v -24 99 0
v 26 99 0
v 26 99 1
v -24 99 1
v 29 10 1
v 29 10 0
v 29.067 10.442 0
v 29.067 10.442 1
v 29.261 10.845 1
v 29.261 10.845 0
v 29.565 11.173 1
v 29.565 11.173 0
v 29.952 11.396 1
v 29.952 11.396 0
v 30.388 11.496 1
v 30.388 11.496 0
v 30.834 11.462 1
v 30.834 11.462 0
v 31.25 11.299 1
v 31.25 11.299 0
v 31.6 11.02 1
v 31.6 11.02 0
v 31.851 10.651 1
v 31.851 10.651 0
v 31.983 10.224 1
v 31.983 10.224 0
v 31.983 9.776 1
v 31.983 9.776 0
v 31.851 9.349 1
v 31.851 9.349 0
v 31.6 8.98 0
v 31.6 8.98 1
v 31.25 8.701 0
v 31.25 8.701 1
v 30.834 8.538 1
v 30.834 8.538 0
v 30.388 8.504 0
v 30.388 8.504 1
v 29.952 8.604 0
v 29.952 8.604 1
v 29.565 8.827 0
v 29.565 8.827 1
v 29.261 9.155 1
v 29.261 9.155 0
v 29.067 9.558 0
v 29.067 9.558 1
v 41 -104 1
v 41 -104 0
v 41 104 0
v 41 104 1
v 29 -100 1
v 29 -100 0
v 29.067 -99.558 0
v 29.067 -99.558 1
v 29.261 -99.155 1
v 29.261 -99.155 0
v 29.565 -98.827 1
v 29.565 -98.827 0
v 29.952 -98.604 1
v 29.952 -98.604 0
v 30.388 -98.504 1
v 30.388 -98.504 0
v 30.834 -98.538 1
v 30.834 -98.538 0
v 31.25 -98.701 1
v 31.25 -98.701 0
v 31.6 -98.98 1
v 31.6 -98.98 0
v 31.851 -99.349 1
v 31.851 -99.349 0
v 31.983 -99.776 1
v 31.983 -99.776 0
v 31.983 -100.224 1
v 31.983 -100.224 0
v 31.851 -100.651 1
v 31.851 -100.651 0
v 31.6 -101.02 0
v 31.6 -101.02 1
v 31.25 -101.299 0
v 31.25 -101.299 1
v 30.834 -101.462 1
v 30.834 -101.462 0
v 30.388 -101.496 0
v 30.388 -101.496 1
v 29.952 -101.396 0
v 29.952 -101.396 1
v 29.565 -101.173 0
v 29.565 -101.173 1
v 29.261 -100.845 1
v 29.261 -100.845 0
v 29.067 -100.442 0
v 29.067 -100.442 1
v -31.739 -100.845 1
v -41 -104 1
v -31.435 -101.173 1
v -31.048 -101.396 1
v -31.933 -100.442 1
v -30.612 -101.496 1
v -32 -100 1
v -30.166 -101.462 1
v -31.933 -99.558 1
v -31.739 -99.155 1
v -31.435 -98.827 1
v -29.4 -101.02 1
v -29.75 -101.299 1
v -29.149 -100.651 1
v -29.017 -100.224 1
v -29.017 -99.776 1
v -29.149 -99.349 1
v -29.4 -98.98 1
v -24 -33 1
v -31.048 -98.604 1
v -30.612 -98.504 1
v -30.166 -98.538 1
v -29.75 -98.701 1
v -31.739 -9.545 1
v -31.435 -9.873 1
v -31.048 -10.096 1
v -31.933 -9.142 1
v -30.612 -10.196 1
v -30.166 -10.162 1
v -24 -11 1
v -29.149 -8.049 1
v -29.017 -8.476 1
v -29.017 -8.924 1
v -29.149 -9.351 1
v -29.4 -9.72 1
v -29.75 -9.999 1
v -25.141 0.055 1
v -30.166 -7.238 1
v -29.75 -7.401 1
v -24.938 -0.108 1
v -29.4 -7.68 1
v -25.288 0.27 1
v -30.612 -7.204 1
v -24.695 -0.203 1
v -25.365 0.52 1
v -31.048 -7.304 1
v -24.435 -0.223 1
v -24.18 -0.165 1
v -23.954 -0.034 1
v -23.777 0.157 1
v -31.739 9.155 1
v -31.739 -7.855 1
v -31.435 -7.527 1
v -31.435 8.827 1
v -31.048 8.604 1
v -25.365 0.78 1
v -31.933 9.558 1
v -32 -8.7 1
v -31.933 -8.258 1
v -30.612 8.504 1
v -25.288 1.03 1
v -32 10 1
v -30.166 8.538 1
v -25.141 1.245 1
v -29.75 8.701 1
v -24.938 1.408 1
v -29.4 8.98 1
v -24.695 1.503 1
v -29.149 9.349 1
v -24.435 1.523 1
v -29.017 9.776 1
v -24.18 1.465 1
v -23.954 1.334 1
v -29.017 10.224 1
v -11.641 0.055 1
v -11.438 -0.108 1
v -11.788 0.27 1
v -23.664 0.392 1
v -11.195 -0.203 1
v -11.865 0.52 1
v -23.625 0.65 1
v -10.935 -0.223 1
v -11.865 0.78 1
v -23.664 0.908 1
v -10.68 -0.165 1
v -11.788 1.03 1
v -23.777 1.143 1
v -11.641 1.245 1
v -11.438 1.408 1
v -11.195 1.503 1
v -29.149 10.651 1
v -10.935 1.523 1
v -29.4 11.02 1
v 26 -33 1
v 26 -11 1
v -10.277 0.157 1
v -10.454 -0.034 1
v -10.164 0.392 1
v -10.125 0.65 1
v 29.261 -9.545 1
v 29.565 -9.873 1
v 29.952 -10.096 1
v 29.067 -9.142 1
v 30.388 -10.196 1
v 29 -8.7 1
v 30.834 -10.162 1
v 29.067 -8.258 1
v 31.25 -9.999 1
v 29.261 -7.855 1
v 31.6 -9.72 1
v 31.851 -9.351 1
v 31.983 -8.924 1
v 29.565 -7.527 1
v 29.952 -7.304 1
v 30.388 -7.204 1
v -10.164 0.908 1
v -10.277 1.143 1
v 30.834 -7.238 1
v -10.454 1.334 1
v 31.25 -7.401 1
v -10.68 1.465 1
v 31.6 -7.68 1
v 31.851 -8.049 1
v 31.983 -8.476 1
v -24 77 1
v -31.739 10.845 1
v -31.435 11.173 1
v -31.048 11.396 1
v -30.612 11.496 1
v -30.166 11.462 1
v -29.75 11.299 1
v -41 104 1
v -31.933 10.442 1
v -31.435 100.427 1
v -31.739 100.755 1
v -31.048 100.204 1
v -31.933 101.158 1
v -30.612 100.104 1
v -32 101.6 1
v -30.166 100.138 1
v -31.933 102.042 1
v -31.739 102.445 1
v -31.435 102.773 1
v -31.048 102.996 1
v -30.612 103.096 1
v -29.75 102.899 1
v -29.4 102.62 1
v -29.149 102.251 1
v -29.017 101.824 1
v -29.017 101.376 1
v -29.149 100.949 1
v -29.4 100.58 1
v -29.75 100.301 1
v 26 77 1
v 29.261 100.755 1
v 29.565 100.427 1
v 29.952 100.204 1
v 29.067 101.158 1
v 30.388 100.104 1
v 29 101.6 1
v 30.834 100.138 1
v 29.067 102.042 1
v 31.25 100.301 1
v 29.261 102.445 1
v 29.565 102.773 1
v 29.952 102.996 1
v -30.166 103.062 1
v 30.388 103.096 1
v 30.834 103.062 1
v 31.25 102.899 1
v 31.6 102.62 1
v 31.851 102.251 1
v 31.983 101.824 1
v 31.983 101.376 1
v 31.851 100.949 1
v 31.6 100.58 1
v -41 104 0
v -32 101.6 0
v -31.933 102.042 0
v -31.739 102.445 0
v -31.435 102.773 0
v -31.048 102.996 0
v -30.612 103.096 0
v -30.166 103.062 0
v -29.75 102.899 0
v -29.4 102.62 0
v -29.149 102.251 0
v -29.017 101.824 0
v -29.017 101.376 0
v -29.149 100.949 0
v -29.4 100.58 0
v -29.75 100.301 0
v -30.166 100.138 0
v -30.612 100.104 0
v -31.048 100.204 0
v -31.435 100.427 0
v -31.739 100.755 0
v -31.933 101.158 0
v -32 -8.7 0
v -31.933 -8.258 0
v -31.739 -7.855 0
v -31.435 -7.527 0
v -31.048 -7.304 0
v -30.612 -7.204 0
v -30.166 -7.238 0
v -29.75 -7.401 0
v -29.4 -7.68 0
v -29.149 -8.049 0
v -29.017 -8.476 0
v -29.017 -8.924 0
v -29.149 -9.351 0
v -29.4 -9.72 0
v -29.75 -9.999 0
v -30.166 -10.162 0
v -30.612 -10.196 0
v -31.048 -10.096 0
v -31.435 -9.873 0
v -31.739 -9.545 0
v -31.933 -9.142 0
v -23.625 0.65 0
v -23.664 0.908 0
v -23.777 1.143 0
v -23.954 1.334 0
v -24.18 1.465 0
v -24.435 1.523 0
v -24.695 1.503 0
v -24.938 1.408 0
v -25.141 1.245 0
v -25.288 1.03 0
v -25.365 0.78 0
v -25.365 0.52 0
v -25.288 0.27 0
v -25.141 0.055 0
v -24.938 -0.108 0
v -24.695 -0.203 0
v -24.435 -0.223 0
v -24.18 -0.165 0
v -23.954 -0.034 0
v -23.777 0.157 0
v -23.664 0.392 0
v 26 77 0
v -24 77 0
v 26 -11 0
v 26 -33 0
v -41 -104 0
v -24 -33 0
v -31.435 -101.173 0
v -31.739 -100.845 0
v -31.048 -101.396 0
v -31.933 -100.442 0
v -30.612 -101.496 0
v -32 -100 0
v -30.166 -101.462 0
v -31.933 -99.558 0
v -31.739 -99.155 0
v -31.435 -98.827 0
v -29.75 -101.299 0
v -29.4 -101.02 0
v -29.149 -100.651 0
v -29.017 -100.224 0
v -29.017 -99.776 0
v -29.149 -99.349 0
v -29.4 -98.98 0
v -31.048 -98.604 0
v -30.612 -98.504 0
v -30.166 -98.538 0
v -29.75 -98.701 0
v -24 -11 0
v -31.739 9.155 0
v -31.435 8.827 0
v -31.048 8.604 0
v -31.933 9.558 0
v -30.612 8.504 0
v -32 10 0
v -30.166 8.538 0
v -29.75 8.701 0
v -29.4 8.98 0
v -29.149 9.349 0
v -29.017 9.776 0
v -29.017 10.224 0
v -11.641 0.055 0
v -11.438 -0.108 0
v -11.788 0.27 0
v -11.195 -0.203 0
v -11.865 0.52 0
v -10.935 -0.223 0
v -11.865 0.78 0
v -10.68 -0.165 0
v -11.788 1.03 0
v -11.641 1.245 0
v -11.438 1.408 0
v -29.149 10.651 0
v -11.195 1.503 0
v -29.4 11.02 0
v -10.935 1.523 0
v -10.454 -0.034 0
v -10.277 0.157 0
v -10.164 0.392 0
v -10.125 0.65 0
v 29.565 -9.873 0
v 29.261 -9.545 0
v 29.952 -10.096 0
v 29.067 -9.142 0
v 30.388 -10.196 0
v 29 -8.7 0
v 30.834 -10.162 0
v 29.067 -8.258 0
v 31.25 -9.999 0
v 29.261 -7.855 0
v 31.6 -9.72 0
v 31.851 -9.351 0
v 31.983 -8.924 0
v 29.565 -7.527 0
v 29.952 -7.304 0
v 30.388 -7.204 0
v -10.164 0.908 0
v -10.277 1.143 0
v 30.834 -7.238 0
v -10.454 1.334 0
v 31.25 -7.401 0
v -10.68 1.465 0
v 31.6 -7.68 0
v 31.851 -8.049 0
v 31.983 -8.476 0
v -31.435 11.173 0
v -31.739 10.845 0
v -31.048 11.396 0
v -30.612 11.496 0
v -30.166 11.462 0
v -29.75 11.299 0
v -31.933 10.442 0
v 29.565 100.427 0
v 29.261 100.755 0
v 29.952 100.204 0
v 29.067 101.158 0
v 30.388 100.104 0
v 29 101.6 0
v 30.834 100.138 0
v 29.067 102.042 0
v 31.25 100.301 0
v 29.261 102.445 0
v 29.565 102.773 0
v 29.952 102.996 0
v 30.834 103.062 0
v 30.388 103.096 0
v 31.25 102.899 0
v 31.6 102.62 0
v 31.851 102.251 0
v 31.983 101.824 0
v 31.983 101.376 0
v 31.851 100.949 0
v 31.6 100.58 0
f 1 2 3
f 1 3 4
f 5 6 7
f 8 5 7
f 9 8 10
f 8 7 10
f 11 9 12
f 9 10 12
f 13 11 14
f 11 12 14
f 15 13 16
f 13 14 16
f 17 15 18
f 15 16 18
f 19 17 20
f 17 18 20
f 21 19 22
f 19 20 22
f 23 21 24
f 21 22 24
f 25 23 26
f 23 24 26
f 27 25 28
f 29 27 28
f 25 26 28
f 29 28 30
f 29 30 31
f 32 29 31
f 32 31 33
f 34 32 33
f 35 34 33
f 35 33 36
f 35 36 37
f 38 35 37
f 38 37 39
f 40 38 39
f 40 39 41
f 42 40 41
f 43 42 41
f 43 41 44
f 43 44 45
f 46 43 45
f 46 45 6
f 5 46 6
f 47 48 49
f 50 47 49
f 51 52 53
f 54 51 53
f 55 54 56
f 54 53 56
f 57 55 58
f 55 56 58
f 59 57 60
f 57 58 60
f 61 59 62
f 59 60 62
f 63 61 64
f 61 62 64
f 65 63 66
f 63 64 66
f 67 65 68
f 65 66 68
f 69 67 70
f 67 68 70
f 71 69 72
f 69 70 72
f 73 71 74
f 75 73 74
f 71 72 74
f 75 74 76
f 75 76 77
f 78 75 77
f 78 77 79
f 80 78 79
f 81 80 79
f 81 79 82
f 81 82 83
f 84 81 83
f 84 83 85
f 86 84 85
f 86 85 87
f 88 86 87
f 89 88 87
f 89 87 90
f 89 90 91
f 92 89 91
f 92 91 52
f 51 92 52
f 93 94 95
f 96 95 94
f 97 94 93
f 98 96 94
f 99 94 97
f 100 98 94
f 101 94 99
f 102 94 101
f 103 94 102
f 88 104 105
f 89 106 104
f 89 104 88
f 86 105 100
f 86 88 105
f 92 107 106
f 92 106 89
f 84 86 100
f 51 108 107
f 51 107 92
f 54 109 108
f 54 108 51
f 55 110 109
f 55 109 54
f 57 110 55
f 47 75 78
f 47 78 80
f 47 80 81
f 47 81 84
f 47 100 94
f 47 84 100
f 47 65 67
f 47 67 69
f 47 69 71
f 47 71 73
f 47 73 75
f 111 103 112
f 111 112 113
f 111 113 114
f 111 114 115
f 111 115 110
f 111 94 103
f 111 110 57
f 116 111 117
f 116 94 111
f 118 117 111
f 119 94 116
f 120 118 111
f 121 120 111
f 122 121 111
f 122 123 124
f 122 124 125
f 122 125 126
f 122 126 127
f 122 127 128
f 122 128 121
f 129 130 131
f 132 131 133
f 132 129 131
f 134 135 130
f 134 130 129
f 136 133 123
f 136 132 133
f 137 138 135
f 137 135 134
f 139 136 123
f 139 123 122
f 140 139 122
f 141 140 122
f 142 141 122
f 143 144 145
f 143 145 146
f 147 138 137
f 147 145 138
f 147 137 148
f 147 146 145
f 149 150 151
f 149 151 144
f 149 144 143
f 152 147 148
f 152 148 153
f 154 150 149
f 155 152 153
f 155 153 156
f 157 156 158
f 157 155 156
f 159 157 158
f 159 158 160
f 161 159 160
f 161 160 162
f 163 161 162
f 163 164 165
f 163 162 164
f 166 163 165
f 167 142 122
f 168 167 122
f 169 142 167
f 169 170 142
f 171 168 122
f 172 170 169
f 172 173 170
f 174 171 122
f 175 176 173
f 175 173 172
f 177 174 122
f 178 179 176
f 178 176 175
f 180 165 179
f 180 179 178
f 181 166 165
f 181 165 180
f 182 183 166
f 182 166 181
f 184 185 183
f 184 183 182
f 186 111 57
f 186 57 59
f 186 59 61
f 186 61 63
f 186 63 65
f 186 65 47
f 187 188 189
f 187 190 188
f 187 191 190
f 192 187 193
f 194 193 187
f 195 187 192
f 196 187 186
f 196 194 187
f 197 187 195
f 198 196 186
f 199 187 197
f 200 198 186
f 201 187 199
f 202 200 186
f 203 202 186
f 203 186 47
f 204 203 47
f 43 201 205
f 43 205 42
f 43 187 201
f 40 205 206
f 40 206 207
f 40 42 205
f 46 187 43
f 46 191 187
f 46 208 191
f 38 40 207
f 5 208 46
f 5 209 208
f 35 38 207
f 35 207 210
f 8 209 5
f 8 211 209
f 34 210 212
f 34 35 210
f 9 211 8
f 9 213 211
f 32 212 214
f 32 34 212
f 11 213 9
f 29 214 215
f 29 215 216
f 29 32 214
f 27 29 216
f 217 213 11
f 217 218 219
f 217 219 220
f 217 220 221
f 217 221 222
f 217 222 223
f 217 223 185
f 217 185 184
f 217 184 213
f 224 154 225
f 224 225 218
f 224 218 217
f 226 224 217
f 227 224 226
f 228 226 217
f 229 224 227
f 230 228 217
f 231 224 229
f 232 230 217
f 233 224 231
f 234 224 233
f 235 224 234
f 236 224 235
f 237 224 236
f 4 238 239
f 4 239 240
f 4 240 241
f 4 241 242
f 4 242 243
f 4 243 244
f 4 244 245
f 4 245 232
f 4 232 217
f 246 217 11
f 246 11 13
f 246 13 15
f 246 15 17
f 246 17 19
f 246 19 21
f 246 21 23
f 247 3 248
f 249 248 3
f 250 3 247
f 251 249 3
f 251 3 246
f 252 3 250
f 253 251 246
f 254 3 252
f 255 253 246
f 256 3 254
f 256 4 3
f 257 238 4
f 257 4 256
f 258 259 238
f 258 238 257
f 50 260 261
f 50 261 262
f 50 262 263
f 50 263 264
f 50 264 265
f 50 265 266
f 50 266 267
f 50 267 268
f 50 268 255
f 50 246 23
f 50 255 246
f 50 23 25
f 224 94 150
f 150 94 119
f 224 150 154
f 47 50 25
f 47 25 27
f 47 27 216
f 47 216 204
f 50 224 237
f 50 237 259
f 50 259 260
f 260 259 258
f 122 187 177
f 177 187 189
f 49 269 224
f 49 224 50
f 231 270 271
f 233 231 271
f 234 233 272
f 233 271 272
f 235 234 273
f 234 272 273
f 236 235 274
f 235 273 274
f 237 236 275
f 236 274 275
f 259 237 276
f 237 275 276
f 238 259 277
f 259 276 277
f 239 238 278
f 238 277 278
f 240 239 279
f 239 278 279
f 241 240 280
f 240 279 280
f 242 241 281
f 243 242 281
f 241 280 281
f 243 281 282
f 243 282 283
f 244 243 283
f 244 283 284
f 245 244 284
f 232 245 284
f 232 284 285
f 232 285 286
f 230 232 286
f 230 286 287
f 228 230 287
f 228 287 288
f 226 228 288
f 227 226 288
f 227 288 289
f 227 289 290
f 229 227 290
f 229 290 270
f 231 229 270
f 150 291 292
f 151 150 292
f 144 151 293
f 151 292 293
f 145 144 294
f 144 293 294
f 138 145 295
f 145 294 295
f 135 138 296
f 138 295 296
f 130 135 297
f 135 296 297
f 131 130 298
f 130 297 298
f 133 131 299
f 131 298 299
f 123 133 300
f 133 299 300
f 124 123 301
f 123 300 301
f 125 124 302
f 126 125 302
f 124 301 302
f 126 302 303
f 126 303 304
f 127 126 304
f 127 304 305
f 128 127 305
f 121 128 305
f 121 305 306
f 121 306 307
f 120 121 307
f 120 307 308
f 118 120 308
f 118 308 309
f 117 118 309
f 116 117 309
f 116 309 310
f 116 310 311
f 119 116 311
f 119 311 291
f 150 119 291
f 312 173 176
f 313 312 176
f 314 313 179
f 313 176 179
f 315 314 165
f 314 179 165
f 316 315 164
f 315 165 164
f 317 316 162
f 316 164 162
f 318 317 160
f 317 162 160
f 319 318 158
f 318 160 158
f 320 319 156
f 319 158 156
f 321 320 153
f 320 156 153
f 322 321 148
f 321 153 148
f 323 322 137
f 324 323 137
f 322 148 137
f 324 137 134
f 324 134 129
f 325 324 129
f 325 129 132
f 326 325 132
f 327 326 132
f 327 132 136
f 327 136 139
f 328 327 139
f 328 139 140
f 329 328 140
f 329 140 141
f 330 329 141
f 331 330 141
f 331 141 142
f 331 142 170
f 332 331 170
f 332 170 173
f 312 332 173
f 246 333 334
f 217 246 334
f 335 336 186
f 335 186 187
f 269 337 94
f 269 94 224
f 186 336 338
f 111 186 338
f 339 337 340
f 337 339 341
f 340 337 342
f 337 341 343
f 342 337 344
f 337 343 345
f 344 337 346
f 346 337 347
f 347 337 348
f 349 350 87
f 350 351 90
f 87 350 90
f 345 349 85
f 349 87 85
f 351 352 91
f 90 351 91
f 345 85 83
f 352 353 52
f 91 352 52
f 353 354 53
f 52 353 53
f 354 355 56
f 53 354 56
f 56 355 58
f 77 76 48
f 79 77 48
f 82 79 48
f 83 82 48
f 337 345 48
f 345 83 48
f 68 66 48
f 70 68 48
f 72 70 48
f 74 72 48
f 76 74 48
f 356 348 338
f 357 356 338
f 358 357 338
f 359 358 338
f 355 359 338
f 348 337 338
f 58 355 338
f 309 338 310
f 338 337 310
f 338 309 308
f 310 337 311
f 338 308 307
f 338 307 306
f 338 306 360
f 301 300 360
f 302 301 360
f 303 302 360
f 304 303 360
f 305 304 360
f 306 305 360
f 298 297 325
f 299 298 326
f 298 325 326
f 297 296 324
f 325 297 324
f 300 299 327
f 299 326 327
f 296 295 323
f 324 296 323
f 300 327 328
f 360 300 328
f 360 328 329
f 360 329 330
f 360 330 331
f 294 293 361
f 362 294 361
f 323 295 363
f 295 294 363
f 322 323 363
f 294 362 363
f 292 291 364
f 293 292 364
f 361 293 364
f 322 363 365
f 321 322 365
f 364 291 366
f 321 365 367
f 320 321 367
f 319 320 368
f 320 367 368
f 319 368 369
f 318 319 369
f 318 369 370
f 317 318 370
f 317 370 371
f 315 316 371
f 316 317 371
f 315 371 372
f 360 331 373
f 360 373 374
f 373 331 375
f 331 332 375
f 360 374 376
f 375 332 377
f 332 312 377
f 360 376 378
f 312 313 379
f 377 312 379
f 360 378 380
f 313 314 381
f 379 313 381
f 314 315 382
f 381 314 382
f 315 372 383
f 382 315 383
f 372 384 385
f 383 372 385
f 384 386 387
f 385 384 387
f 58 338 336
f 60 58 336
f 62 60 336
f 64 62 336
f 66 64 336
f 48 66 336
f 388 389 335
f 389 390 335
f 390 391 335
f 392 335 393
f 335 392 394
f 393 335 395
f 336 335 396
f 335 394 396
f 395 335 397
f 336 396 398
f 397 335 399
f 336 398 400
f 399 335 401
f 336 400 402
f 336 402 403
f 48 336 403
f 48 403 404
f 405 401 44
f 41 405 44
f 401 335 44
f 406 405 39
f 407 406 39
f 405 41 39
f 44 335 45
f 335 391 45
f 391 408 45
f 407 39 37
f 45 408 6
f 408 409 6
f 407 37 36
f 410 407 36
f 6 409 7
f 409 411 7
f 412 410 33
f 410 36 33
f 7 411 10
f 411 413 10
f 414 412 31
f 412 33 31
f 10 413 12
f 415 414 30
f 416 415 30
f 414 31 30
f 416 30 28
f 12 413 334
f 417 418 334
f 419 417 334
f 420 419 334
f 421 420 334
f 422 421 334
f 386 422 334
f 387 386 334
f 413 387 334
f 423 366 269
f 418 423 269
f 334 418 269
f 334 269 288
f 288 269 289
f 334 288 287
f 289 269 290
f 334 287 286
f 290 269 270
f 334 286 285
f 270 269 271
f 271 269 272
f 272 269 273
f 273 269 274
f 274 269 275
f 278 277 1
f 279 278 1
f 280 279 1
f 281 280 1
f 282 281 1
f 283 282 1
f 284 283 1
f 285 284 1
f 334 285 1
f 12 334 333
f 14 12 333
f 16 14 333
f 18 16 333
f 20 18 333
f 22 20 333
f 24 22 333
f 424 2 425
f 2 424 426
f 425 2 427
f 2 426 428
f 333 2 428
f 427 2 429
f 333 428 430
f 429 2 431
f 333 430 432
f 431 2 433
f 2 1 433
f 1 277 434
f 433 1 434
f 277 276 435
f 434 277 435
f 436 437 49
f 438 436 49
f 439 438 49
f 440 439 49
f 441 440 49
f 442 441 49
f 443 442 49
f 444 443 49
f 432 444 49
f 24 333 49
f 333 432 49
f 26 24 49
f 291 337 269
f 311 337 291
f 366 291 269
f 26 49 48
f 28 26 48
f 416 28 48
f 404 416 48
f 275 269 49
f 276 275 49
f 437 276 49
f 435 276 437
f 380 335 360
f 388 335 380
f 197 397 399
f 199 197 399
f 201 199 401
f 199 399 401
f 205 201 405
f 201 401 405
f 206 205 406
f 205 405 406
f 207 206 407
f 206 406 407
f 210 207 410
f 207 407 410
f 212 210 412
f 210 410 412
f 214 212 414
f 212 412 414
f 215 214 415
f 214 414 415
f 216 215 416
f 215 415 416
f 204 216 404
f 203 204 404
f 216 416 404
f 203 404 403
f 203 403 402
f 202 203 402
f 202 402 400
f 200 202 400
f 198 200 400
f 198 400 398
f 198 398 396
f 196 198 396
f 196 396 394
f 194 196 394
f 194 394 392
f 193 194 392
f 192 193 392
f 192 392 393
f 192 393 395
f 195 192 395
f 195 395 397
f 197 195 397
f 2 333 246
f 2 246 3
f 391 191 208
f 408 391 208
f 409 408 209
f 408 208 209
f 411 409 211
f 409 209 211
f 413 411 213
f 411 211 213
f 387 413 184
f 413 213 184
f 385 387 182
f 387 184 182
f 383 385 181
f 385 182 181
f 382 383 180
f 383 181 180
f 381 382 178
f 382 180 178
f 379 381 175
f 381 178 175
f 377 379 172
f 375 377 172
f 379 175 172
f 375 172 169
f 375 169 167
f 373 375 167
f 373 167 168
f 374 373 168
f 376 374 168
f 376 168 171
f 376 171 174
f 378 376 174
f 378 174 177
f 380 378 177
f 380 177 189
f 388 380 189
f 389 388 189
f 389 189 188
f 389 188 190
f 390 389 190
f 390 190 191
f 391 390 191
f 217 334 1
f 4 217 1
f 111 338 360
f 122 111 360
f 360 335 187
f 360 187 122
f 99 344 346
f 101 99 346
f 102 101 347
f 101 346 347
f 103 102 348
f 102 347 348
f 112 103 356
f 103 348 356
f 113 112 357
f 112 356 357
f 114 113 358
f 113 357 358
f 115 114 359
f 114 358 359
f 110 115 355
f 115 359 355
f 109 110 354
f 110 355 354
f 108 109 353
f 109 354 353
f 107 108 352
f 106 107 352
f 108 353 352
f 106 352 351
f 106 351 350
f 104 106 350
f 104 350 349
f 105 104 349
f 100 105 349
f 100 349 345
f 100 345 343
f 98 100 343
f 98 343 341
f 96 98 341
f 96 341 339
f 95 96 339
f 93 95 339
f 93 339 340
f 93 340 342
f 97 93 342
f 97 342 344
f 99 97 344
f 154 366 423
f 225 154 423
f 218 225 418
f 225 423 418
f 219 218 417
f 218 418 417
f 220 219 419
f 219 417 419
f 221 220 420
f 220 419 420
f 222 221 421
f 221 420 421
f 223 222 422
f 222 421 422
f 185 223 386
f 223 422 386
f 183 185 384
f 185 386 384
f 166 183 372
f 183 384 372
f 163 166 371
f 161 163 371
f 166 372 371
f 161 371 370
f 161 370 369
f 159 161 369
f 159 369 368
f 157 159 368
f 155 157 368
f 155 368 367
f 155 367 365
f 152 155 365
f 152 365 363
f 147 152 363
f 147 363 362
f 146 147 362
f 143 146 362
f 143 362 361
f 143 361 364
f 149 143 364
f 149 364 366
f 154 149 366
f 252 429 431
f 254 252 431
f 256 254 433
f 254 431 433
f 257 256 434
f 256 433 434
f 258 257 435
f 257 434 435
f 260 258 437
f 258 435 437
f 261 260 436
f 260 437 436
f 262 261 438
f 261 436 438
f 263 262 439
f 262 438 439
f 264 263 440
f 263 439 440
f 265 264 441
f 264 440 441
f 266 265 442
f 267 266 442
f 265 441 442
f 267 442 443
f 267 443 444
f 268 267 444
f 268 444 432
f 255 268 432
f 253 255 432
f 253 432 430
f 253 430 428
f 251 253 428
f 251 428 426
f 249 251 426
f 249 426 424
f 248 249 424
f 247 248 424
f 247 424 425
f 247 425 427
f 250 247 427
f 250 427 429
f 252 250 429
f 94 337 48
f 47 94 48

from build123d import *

# Parameters (mm, degrees)
SKETCH1_W                    = 82
SKETCH1_H                    = 208
BOSS_EXTRUDE1_DEPTH          = 1
F_3_0_3_DIAMETER_HOLE1_D     = 3
SKETCH7_W                    = 50
SKETCH7_H                    = 22
CUT_EXTRUDE1_DEPTH           = 10
F_1_75_1_75_DIAMETER_HOLE1_D = 1.75


with BuildPart() as part:
    # Sketch1 → Boss-Extrude1 (new body)
    with BuildSketch(Plane.XY):
        Rectangle(SKETCH1_W, SKETCH1_H)
    extrude(amount=BOSS_EXTRUDE1_DEPTH)

    # Ø3.0 (3) Diameter Hole1 (through all)
    with Locations(Plane.XY.offset(1)):
        with Locations((-30.5, 10), (30.5, 10), (30.5, -100), (-30.5, -100), (-30.5, 101.59999968), (30.5, 101.59999968), (30.5, -8.7), (-30.5, -8.7)):
            Hole(F_3_0_3_DIAMETER_HOLE1_D / 2)

    # Sketch7 → Cut-Extrude1 (cut)
    with BuildSketch(Plane(origin=(0, 0, 0), x_dir=(-1, 0, 0), z_dir=(0, 0, -1))):
        with Locations((-1, -22)):
            Rectangle(SKETCH7_W, SKETCH7_H)
        with Locations((-1, 88)):
            Rectangle(SKETCH7_W, SKETCH7_H)
    extrude(amount=-CUT_EXTRUDE1_DEPTH, mode=Mode.SUBTRACT)

    # Ø1.75 (1.75) Diameter Hole1 (through all)
    with Locations(Plane(origin=(0, 0, 0), x_dir=(-1, 0, 0), z_dir=(0, 0, -1))):
        with Locations((24.5, 0.65), (11, 0.65)):
            Hole(F_1_75_1_75_DIAMETER_HOLE1_D / 2)


solid = part.part
